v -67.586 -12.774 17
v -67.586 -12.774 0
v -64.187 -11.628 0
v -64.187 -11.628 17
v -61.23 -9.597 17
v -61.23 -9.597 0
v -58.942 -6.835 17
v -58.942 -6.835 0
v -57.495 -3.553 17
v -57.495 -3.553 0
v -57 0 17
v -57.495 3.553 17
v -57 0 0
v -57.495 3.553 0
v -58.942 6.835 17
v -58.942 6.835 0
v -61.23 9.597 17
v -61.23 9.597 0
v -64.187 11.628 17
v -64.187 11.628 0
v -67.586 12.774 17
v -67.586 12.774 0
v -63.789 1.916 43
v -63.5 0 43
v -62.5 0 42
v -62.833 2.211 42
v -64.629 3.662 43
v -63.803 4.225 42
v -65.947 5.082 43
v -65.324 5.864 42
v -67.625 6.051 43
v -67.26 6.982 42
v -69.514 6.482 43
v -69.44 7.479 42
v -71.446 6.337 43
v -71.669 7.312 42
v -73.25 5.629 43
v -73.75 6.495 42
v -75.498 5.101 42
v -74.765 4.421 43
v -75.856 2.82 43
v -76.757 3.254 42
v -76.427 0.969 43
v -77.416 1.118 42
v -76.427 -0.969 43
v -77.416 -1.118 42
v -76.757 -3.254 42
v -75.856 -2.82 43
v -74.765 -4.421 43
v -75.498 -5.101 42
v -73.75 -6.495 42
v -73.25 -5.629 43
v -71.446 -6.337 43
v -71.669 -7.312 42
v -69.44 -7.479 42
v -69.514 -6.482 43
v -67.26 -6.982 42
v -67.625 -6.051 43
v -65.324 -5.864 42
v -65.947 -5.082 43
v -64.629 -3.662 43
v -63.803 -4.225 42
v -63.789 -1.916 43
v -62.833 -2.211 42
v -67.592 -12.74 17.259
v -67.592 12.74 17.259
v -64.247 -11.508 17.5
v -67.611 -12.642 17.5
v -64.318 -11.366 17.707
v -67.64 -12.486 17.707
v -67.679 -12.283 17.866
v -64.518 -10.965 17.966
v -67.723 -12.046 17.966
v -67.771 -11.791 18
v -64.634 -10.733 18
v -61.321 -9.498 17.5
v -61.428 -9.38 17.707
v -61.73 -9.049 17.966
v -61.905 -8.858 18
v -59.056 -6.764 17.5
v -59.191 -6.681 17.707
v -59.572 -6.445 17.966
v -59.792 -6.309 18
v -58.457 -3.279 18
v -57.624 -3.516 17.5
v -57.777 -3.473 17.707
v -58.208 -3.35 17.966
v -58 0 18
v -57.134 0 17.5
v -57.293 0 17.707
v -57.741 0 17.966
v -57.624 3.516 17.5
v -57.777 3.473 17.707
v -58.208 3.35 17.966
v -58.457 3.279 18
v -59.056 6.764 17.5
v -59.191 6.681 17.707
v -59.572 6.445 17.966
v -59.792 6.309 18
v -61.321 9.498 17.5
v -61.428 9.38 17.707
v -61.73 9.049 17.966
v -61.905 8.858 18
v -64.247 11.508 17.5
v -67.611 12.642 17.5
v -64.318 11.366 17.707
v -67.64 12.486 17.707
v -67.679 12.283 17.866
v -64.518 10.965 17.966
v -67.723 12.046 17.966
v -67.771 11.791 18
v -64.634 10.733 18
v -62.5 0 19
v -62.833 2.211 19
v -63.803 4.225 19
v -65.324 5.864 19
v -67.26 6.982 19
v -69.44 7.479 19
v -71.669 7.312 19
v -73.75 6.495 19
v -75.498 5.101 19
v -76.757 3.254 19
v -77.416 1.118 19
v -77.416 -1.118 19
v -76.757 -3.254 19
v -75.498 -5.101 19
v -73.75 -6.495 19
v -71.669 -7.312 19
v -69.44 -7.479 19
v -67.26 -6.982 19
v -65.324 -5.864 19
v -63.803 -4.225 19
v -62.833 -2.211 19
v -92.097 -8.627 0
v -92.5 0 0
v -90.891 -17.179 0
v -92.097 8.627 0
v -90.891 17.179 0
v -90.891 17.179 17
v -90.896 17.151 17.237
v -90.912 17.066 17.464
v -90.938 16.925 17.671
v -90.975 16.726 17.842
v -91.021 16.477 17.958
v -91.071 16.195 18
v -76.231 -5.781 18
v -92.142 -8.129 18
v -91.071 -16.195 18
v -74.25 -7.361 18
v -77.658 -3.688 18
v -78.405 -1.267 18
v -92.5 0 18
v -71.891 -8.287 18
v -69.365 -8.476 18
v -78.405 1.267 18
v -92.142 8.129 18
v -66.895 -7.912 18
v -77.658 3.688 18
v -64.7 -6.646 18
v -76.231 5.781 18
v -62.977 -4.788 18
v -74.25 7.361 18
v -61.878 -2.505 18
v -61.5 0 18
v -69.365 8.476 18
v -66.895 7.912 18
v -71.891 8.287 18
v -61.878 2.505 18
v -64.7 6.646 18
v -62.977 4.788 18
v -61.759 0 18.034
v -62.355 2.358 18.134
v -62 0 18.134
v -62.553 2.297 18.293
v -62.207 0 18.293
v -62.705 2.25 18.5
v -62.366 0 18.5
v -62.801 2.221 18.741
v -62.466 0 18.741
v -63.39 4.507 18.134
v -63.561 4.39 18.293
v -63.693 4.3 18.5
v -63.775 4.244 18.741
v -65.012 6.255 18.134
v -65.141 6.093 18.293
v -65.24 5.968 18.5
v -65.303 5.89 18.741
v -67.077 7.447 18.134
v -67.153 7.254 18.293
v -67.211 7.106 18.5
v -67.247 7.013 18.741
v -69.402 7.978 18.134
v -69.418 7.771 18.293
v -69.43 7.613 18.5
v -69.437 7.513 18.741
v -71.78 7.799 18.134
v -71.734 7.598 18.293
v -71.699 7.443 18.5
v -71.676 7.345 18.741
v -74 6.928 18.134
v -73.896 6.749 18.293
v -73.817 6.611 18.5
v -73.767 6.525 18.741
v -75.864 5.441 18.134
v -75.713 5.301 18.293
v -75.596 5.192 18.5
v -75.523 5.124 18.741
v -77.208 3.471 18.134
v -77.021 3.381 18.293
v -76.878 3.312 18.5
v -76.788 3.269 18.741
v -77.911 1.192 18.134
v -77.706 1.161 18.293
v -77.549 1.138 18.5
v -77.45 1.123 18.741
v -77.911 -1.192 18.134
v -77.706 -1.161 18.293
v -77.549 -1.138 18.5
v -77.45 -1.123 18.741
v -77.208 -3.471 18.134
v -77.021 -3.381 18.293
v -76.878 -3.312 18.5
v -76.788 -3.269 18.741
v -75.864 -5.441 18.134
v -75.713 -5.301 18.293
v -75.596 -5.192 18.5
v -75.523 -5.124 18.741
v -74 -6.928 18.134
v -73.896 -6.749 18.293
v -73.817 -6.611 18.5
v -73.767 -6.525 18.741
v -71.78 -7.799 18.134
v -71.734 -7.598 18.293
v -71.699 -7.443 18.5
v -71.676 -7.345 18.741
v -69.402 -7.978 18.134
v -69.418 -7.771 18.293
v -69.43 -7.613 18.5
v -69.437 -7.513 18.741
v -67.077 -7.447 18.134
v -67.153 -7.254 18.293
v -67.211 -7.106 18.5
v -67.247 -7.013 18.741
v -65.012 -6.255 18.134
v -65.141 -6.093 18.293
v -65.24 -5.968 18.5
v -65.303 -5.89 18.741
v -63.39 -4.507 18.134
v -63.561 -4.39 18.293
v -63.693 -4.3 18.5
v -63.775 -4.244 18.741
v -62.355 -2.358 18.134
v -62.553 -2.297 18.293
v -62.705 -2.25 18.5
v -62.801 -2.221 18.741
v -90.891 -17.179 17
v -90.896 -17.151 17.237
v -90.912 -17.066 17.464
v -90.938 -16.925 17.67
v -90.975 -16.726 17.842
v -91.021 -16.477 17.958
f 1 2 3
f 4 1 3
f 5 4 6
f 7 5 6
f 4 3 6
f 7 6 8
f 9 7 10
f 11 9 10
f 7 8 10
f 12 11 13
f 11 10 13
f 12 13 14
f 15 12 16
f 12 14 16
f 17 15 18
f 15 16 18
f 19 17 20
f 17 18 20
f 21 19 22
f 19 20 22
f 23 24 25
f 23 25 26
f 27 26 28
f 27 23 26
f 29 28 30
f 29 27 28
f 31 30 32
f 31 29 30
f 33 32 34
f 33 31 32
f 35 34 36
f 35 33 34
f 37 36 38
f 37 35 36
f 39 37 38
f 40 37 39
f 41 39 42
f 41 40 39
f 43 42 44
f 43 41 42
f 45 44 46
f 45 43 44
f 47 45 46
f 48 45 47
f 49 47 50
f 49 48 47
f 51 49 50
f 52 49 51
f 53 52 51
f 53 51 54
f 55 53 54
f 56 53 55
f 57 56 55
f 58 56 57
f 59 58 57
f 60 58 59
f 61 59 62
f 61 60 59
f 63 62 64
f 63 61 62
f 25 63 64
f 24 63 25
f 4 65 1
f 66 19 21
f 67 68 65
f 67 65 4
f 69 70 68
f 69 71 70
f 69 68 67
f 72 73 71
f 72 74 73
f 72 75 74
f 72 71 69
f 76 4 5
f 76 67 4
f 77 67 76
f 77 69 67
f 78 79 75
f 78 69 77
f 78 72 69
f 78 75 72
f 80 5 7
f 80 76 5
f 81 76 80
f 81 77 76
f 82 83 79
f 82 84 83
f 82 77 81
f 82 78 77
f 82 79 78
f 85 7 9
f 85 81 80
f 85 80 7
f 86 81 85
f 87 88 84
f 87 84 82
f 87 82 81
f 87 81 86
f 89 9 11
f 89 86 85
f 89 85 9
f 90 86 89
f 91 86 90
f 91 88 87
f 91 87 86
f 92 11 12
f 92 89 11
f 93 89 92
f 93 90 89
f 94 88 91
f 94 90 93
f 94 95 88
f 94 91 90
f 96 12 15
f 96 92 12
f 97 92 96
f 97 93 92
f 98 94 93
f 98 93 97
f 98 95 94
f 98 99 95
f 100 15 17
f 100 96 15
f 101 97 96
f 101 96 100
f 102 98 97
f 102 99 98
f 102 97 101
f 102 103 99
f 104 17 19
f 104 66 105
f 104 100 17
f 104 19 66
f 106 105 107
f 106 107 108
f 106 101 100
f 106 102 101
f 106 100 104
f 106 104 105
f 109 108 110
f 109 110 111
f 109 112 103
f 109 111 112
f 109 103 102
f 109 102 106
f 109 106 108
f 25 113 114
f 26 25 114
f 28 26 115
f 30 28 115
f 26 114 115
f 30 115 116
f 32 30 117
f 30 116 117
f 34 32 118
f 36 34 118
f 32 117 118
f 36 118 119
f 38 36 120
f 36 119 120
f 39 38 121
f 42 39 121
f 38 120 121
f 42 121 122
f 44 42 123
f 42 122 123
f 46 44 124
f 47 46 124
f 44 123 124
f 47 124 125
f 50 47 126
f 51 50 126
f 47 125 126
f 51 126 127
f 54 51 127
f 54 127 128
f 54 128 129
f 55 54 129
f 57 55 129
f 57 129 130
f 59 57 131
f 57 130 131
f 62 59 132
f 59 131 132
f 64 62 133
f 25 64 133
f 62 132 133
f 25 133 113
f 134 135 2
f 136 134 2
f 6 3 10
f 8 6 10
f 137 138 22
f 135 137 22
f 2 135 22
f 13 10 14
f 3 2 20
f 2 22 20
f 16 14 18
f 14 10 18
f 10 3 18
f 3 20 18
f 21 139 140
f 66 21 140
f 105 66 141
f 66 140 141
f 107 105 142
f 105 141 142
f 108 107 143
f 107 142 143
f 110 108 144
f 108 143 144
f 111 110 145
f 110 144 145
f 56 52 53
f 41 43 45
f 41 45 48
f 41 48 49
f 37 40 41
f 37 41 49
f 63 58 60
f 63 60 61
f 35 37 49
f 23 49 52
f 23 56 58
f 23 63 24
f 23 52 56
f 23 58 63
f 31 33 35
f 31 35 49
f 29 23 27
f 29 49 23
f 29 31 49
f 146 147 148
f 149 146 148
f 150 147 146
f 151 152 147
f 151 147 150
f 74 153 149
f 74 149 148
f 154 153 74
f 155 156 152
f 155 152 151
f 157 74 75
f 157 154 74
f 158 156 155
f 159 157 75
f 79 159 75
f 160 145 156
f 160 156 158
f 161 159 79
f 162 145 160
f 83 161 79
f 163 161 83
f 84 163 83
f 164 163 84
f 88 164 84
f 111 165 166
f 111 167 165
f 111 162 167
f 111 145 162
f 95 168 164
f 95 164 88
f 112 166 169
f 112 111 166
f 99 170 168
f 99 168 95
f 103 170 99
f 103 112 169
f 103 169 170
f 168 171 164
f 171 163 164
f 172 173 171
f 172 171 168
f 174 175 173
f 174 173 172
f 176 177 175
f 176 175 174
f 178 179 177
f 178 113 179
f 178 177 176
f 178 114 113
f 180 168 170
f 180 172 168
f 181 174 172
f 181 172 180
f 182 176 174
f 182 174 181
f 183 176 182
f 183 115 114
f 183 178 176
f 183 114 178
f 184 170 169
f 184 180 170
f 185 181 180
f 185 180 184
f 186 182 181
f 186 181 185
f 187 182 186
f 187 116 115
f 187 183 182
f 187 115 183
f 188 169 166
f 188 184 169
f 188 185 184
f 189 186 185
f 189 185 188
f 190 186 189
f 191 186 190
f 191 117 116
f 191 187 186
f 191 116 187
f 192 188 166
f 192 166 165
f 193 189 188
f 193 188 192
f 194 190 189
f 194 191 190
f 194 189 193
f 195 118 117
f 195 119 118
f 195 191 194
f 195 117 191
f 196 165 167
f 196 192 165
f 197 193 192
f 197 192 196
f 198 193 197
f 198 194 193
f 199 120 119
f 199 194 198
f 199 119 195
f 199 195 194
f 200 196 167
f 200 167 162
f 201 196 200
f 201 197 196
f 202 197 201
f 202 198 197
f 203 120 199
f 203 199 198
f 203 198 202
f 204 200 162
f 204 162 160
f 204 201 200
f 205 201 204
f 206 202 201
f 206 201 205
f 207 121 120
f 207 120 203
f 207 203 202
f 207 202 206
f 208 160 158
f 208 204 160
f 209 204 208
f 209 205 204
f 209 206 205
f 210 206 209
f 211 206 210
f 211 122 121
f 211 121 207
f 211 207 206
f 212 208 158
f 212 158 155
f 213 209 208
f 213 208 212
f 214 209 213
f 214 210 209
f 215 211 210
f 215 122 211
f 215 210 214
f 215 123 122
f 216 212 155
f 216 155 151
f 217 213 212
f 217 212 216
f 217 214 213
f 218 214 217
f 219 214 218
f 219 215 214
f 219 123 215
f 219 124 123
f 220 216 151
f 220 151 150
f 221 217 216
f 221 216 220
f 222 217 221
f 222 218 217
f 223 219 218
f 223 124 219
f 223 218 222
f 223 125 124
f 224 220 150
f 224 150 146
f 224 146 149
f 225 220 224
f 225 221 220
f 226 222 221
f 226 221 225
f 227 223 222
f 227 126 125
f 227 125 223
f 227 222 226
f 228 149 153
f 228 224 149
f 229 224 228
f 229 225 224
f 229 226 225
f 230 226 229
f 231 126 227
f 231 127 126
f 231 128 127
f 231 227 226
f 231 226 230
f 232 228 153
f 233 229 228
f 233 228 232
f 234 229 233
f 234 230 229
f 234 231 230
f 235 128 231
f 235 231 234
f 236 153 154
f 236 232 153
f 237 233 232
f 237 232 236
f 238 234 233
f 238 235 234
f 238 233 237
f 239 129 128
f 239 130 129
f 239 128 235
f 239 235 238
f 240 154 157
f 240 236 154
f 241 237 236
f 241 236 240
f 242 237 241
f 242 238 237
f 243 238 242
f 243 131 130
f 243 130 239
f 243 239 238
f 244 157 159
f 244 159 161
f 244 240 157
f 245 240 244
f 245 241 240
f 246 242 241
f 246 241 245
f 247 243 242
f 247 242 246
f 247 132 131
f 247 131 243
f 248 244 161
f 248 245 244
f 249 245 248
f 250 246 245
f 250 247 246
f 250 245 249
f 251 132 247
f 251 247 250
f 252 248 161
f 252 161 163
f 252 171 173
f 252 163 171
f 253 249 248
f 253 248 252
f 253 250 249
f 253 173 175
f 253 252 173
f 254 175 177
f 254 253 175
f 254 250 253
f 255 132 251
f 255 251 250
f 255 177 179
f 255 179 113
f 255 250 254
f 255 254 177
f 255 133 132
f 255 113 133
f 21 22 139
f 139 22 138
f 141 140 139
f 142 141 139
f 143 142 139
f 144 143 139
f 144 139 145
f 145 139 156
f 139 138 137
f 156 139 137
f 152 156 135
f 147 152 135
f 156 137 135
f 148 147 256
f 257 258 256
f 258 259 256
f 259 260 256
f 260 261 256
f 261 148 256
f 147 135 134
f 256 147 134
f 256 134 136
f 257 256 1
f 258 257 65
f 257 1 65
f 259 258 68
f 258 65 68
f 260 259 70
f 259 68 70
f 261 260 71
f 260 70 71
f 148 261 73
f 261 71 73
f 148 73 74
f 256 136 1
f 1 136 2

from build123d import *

# Parameters (mm, degrees)
F1_DEPTH = 18
F2_R     = 7.5
F3_DEPTH = 25
F4_R     = 1
F5_SIZE  = 1


with BuildPart() as f1:
    # F0 (on Top) → F1 (new body)
    with BuildSketch(Plane.XY):
        with BuildLine():
            Line((-67.585714, 12.773849), (-90.89085, 17.178571))
            ThreePointArc((-90.89085, 17.178571), (-92.5, 0), (-90.89085, -17.178571))
            Line((-90.89085, -17.178571), (-67.585714, -12.773849))
            ThreePointArc((-67.585714, -12.773849), (-57, 0), (-67.585714, 12.773849))
        make_face()
    extrude(amount=F1_DEPTH)

    # F2 (on face) → F3 (join)
    with BuildSketch(Plane.XY.offset(18)):
        with Locations((-70, 0)):
            Circle(F2_R)
    extrude(amount=F3_DEPTH)

    # F4
    f4_edges = [f1.edges().sort_by_distance(p)[0] for p in [
        (-77.5, 0, 18),
        (-79.238282, 14.97621, 18),
    ]]
    fillet(f4_edges, radius=F4_R)

    # F5
    f5_edges = [f1.edges().sort_by_distance(p)[0] for p in [
        (-77.5, 0, 43),
    ]]
    chamfer(f5_edges, length=F5_SIZE)


solid = f1.part
